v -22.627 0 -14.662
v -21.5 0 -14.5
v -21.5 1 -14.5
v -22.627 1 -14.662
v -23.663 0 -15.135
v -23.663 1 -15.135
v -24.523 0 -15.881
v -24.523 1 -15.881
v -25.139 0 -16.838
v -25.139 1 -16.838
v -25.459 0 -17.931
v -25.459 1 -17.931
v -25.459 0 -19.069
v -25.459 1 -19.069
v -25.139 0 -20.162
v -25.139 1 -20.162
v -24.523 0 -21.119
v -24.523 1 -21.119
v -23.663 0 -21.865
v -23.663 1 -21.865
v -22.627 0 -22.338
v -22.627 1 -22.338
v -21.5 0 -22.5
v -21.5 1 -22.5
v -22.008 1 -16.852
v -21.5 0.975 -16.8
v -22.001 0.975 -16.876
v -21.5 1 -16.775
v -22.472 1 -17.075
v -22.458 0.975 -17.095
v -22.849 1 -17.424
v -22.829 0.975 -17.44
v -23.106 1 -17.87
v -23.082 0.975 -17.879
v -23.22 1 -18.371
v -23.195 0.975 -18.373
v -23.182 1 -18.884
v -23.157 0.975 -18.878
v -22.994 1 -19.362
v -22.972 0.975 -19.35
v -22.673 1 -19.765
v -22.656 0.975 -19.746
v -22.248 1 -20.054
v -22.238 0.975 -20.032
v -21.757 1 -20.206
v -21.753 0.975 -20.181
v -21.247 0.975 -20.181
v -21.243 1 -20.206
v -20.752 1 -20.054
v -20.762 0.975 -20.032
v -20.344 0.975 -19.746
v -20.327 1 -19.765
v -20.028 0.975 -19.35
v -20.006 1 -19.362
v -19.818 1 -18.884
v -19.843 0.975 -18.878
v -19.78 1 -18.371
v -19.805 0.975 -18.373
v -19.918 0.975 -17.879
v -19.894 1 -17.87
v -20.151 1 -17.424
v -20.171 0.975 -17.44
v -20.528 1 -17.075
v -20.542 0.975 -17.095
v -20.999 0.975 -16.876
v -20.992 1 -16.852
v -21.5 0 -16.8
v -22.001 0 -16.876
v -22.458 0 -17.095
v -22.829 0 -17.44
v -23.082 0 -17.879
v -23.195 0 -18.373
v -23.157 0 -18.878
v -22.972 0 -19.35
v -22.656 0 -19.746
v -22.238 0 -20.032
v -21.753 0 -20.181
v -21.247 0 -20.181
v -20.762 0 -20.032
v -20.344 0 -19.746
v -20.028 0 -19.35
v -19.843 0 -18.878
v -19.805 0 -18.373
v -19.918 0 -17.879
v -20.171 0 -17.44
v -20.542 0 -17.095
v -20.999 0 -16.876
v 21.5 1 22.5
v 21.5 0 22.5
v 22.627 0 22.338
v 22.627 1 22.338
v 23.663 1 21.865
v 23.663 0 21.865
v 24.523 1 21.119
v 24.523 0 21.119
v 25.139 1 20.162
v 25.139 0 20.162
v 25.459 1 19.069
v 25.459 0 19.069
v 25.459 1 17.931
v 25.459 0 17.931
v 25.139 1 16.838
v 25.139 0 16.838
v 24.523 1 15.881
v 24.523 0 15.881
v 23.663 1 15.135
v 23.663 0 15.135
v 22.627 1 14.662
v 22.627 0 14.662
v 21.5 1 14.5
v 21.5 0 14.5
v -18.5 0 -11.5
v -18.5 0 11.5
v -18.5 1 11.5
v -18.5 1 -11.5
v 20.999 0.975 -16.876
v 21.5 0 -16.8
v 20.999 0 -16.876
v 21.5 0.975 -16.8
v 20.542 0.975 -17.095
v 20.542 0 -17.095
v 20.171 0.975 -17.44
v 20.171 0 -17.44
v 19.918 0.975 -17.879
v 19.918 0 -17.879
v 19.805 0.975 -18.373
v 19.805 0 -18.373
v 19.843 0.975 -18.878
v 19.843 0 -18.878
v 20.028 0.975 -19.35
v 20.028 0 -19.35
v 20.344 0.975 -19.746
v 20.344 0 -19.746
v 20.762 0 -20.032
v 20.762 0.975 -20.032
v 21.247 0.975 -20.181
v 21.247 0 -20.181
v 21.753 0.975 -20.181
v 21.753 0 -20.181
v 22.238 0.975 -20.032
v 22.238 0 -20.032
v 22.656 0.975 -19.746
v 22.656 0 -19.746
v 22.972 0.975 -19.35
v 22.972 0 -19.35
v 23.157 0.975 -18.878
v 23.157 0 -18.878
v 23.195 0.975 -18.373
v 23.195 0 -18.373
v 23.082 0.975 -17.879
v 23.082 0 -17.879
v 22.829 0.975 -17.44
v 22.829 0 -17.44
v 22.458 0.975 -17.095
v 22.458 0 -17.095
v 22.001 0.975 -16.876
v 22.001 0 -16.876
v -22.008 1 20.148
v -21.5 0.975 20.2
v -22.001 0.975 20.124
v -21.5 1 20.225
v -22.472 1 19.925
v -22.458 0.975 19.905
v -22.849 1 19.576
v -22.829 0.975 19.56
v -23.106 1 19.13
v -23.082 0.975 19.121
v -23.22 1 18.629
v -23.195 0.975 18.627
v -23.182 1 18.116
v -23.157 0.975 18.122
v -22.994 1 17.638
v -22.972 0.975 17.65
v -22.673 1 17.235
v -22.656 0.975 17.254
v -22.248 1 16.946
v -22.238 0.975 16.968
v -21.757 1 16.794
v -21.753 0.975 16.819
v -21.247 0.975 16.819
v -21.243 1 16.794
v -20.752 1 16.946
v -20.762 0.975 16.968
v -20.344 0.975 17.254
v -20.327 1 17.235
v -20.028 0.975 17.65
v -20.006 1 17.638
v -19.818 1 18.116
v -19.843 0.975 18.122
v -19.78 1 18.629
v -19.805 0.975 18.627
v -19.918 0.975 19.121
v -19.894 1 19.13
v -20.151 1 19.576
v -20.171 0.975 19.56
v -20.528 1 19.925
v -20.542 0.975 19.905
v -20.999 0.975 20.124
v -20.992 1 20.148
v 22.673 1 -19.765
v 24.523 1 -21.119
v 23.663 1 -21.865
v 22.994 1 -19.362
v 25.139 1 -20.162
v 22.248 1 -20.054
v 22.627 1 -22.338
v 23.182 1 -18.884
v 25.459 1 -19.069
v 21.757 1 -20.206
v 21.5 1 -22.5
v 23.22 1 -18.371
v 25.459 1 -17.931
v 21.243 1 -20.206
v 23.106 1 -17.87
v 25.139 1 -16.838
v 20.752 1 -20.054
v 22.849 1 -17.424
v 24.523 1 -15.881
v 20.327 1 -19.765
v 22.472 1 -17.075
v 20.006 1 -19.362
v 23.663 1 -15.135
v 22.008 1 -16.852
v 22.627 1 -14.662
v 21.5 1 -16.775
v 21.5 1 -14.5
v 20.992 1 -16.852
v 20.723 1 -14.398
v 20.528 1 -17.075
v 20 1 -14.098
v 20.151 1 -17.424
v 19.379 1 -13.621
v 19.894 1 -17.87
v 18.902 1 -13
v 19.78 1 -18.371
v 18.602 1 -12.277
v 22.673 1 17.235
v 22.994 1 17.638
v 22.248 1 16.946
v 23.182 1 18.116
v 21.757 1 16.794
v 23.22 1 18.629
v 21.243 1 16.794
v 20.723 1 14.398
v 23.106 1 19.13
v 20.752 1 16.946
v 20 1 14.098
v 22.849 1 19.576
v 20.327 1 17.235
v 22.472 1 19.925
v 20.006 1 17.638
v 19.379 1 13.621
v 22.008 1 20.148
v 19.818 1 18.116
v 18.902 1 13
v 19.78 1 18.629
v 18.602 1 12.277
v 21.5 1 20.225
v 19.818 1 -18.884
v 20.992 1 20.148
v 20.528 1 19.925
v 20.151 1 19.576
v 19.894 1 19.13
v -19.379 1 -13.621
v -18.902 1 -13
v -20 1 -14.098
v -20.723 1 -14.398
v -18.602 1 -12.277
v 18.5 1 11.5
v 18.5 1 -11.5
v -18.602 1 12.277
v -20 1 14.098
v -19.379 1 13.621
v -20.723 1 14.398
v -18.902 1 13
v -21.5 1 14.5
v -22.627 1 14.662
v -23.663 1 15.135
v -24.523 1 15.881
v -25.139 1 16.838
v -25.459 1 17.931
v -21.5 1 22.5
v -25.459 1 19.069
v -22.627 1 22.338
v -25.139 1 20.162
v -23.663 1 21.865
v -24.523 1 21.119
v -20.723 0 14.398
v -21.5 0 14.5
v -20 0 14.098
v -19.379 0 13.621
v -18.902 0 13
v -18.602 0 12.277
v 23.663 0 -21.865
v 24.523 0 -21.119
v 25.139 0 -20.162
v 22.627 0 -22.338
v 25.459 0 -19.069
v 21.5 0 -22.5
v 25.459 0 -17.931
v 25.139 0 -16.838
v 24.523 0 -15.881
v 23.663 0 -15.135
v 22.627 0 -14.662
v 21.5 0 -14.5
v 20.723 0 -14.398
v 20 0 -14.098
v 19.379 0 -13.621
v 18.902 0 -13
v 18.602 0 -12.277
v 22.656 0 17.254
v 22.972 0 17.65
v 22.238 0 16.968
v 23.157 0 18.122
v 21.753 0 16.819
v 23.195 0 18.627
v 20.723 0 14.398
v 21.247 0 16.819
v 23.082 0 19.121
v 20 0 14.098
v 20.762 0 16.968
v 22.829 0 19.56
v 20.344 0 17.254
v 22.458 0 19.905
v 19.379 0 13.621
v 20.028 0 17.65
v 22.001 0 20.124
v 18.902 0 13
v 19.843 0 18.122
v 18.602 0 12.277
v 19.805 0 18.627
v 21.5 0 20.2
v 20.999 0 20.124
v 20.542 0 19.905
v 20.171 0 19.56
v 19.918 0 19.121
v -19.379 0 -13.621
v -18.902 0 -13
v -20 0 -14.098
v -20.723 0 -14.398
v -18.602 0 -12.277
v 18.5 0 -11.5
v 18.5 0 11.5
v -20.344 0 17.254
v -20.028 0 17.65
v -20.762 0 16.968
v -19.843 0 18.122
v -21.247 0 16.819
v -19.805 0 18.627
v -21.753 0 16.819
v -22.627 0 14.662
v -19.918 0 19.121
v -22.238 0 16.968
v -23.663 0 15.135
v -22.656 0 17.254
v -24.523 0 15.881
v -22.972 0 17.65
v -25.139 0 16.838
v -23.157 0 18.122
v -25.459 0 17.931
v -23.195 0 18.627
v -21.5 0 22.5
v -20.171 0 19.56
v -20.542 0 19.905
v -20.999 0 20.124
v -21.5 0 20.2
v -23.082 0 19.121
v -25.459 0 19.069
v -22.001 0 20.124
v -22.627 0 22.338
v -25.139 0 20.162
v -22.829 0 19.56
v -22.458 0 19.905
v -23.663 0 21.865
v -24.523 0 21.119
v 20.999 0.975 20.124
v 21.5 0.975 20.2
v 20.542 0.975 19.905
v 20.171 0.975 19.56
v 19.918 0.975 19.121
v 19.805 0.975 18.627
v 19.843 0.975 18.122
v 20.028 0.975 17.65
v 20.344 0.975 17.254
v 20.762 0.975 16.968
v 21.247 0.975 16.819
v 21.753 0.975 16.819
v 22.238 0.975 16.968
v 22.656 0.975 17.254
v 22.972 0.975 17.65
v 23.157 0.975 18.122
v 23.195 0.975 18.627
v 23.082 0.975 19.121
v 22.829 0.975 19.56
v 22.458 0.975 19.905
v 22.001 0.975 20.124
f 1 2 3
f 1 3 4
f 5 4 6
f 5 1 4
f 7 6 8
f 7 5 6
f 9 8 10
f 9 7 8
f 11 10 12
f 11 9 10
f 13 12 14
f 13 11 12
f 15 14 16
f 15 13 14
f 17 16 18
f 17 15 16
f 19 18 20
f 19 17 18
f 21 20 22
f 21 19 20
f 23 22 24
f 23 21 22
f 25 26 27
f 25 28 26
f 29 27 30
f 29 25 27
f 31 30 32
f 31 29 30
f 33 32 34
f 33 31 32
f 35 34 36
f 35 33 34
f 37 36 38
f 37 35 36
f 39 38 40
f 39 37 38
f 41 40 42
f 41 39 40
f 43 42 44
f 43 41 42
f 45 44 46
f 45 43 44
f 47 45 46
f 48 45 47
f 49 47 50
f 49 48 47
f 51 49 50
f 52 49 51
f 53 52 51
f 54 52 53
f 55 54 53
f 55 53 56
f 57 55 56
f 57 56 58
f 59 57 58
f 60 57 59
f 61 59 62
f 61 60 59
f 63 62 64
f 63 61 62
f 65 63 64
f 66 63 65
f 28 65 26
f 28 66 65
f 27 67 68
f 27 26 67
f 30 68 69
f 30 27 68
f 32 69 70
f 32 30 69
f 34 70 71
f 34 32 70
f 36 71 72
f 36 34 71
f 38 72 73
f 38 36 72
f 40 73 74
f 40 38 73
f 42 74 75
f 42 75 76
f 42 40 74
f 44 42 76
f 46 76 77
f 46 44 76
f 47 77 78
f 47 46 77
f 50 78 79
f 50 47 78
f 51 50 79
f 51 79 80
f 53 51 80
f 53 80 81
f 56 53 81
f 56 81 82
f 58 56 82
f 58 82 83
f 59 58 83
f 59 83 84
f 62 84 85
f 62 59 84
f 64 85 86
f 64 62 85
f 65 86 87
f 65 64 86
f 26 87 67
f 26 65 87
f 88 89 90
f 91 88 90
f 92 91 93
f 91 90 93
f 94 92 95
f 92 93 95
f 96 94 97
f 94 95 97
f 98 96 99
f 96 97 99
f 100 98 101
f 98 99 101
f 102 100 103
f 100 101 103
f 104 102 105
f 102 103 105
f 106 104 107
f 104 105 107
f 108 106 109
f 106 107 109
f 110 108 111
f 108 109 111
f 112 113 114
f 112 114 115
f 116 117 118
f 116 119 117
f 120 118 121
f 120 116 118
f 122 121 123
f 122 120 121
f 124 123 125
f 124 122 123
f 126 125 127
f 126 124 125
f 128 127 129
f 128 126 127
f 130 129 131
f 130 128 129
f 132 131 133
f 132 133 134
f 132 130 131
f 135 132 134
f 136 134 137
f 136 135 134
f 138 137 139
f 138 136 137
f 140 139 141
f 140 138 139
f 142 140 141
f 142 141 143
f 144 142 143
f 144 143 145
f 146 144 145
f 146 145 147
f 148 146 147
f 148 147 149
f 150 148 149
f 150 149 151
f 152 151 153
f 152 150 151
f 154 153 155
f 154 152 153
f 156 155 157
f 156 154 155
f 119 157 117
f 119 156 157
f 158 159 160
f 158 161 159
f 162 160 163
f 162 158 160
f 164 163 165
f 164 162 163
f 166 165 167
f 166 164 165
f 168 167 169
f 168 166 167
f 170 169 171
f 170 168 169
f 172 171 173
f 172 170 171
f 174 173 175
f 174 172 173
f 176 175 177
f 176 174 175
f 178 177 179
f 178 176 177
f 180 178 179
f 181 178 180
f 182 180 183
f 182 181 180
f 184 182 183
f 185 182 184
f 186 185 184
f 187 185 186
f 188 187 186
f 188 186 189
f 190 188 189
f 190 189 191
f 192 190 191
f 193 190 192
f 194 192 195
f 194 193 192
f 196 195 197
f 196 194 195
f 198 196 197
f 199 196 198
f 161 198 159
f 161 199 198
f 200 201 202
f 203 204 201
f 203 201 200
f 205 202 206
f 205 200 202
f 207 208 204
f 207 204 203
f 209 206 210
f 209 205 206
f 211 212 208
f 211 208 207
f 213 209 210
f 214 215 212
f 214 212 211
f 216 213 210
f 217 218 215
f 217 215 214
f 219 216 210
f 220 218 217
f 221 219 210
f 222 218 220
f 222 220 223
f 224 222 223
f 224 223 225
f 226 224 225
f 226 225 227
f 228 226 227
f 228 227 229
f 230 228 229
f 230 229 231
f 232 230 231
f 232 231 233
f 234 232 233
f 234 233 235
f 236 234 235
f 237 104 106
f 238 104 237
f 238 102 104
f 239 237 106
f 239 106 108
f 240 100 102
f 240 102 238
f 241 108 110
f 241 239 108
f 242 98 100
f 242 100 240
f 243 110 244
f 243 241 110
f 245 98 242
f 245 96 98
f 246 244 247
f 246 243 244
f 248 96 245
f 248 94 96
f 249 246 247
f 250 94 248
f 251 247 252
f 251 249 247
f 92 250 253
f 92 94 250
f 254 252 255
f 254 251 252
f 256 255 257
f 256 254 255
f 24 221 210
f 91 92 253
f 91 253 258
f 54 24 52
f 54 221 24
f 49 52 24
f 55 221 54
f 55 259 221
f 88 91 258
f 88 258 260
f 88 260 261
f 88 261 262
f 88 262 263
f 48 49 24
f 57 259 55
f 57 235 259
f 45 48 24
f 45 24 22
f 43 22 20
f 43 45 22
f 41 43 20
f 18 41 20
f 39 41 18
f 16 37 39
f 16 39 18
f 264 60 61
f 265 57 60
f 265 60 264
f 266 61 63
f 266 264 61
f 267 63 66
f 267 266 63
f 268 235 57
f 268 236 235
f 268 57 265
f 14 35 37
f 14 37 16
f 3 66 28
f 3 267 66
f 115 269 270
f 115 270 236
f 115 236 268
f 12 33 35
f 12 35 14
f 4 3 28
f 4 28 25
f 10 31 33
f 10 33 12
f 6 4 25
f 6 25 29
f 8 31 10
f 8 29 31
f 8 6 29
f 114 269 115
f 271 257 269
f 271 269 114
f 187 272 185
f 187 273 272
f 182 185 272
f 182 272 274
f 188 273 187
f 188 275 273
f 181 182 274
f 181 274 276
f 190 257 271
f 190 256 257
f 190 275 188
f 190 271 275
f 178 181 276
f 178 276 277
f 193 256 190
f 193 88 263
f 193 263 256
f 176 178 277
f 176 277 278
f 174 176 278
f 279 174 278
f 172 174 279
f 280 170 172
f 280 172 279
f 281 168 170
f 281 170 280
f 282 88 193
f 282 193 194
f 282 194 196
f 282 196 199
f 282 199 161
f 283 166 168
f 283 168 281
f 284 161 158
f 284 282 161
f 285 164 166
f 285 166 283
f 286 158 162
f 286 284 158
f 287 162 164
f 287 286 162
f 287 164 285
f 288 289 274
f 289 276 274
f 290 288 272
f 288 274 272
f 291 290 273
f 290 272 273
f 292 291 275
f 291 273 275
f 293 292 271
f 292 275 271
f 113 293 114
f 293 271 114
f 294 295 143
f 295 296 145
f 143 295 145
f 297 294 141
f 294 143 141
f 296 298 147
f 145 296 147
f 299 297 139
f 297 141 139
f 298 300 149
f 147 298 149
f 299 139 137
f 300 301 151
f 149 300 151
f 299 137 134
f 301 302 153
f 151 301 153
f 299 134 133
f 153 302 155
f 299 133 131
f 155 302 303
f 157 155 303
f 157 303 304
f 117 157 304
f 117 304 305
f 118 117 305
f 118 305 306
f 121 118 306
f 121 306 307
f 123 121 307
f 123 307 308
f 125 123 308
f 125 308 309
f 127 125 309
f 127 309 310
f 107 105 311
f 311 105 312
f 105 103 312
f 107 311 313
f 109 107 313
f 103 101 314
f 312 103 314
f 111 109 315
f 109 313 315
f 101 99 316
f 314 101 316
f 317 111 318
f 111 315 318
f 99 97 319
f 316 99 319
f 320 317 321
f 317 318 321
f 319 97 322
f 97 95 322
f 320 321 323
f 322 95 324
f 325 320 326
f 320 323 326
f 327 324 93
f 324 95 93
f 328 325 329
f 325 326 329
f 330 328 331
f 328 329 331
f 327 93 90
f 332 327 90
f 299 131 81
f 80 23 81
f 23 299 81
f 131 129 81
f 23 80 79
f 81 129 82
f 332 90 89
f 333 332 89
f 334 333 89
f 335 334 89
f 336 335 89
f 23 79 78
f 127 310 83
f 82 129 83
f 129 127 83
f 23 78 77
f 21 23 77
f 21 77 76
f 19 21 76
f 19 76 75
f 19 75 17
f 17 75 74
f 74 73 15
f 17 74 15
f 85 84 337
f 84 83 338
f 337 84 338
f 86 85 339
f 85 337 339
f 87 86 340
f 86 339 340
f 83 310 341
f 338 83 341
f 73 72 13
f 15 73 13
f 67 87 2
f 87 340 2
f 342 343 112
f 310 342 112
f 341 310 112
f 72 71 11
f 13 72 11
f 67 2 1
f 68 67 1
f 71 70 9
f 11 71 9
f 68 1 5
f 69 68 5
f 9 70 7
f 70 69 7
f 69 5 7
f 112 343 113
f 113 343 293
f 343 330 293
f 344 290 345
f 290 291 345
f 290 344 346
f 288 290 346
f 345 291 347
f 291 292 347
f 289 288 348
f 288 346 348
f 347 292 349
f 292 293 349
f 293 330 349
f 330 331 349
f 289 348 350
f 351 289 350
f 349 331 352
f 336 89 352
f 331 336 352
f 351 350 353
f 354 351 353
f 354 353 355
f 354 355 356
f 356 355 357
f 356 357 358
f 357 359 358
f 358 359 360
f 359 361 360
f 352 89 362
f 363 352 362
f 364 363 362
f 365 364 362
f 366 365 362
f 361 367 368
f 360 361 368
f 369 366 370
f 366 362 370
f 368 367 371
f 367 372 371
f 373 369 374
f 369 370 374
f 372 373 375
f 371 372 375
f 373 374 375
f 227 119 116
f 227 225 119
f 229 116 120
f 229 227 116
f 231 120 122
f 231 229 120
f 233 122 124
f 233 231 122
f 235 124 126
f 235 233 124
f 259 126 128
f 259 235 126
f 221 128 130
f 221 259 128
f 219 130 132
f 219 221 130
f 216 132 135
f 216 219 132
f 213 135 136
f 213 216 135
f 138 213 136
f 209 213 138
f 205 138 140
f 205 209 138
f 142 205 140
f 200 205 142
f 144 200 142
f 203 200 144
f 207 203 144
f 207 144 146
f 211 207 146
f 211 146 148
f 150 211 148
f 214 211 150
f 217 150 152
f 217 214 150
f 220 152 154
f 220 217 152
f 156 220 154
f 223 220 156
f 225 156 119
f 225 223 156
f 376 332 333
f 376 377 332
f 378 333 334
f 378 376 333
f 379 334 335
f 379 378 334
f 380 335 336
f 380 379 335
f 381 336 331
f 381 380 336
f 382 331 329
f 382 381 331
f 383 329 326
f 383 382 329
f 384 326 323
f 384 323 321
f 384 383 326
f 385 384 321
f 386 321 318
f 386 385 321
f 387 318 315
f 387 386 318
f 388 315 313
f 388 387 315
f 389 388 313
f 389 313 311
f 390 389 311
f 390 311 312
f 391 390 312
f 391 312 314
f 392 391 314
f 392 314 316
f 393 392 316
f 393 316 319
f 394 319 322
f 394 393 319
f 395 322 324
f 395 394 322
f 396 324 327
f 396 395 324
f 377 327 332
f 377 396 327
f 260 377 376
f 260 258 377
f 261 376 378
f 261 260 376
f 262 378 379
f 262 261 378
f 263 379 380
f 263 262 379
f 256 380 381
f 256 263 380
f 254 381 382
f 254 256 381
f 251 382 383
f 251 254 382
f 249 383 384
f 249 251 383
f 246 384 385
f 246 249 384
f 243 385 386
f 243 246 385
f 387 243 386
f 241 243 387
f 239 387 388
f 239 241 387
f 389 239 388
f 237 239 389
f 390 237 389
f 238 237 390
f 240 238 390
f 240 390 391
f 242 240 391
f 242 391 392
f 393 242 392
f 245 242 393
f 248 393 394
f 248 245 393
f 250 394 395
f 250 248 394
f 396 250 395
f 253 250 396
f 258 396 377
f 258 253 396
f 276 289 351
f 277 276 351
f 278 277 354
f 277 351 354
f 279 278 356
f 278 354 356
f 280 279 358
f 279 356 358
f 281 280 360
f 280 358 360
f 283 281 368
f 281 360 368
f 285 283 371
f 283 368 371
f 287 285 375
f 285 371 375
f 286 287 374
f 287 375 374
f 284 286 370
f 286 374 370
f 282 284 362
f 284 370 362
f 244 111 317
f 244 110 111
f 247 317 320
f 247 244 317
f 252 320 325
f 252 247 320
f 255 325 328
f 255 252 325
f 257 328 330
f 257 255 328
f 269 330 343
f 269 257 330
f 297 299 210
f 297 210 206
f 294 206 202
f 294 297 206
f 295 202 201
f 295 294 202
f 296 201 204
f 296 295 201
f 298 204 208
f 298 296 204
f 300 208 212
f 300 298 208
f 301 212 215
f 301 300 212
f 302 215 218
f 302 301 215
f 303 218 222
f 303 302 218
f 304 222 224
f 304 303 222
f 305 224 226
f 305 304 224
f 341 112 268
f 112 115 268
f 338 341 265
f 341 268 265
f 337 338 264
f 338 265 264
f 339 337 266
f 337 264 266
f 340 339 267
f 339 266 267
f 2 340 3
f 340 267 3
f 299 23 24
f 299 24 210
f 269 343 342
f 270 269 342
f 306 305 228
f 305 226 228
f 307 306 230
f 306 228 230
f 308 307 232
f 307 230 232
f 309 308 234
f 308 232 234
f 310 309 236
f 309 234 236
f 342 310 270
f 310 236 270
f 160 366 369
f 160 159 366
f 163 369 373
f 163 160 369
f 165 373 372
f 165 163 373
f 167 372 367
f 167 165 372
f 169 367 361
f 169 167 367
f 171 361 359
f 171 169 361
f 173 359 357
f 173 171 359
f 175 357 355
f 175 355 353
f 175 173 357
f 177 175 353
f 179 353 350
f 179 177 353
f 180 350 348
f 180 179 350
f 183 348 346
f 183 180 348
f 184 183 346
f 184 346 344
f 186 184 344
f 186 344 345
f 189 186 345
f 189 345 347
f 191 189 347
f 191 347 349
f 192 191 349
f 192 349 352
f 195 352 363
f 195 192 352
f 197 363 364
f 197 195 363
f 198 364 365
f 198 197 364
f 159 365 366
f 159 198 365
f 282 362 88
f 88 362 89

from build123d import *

# Parameters (mm, degrees)
SKETCH1_W                     = 37
SKETCH1_H                     = 45
BOSS_EXTRUDE1_DEPTH           = 1
BOSS_EXTRUDE2_DEPTH           = 1
FILLET1_R                     = 3
M3_CLEARANCE_HOLE1_AT_2_COUNT = 2
M3_CLEARANCE_HOLE1_AT_2_PITCH = 37
M3_CLEARANCE_HOLE1_AT_3_COUNT = 2
M3_CLEARANCE_HOLE1_AT_3_PITCH = 56.727418415
M3_CLEARANCE_HOLE1_AT_4_COUNT = 2
M3_CLEARANCE_HOLE1_AT_4_PITCH = 43


with BuildPart() as part:
    # Sketch1 → Boss-Extrude1 (new body)
    with BuildSketch(Plane(origin=(0, 0, 0), x_dir=(1, 0, 0), z_dir=(0, 1, 0))):
        Rectangle(SKETCH1_W, SKETCH1_H)
    extrude(amount=BOSS_EXTRUDE1_DEPTH)

    # Sketch2 → Boss-Extrude2 (add)
    with BuildSketch(Plane.XZ):
        with BuildLine():
            Line((21.5, 14.5), (-21.5, 14.5))
            ThreePointArc((-21.5, 14.5), (-25.5, 18.5), (-21.5, 22.5))
            Line((-21.5, 22.5), (21.5, 22.5))
            ThreePointArc((21.5, 22.5), (25.5, 18.5), (21.5, 14.5))
        make_face()
        with BuildLine():
            Line((21.5, -14.5), (-21.5, -14.5))
            ThreePointArc((-21.5, -14.5), (-25.5, -18.5), (-21.5, -22.5))
            Line((-21.5, -22.5), (21.5, -22.5))
            ThreePointArc((21.5, -22.5), (25.5, -18.5), (21.5, -14.5))
        make_face()
    extrude(amount=-BOSS_EXTRUDE2_DEPTH)

    # Fillet1
    fillet1_edges = [part.edges().sort_by_distance(p)[0] for p in [
        (-18.5, 0.5, 14.5),
        (-18.5, 0.5, -14.5),
        (18.5, 0.5, -14.5),
        (18.5, 0.5, 14.5),
    ]]
    fillet(fillet1_edges, radius=FILLET1_R - 0.0001)  # a hair under: the kernel refuses the full size

    # Sketch5 → M3 Clearance Hole1 (revolve, cut)
    with BuildSketch(Plane(origin=(-21.5, 1, -18.5), x_dir=(0, 0, 1), z_dir=(1, 0, 0))):
        Polygon((0, 0), (0, 1), (1.7, 1), (1.7, 0.025), (1.725, 0), align=None)
    m3_clearance_hole1 = revolve(axis=Axis((-21.5, 7.35, -18.5), (0, -1, 0)), mode=Mode.SUBTRACT)

    # M3 Clearance Hole1 at 2: M3 Clearance Hole1 ×2
    with Locations(*[(0, 0, i * M3_CLEARANCE_HOLE1_AT_2_PITCH) for i in range(1, M3_CLEARANCE_HOLE1_AT_2_COUNT)]):
        add(m3_clearance_hole1, mode=Mode.SUBTRACT)

    # M3 Clearance Hole1 at 3: M3 Clearance Hole1 ×2
    with Locations(*[Vector(0.7580108737829233, 0, 0.6522419146504225) * (i * M3_CLEARANCE_HOLE1_AT_3_PITCH) for i in range(1, M3_CLEARANCE_HOLE1_AT_3_COUNT)]):
        add(m3_clearance_hole1, mode=Mode.SUBTRACT)

    # M3 Clearance Hole1 at 4: M3 Clearance Hole1 ×2
    with Locations(*[(i * M3_CLEARANCE_HOLE1_AT_4_PITCH, 0, 0) for i in range(1, M3_CLEARANCE_HOLE1_AT_4_COUNT)]):
        add(m3_clearance_hole1, mode=Mode.SUBTRACT)


solid = part.part
